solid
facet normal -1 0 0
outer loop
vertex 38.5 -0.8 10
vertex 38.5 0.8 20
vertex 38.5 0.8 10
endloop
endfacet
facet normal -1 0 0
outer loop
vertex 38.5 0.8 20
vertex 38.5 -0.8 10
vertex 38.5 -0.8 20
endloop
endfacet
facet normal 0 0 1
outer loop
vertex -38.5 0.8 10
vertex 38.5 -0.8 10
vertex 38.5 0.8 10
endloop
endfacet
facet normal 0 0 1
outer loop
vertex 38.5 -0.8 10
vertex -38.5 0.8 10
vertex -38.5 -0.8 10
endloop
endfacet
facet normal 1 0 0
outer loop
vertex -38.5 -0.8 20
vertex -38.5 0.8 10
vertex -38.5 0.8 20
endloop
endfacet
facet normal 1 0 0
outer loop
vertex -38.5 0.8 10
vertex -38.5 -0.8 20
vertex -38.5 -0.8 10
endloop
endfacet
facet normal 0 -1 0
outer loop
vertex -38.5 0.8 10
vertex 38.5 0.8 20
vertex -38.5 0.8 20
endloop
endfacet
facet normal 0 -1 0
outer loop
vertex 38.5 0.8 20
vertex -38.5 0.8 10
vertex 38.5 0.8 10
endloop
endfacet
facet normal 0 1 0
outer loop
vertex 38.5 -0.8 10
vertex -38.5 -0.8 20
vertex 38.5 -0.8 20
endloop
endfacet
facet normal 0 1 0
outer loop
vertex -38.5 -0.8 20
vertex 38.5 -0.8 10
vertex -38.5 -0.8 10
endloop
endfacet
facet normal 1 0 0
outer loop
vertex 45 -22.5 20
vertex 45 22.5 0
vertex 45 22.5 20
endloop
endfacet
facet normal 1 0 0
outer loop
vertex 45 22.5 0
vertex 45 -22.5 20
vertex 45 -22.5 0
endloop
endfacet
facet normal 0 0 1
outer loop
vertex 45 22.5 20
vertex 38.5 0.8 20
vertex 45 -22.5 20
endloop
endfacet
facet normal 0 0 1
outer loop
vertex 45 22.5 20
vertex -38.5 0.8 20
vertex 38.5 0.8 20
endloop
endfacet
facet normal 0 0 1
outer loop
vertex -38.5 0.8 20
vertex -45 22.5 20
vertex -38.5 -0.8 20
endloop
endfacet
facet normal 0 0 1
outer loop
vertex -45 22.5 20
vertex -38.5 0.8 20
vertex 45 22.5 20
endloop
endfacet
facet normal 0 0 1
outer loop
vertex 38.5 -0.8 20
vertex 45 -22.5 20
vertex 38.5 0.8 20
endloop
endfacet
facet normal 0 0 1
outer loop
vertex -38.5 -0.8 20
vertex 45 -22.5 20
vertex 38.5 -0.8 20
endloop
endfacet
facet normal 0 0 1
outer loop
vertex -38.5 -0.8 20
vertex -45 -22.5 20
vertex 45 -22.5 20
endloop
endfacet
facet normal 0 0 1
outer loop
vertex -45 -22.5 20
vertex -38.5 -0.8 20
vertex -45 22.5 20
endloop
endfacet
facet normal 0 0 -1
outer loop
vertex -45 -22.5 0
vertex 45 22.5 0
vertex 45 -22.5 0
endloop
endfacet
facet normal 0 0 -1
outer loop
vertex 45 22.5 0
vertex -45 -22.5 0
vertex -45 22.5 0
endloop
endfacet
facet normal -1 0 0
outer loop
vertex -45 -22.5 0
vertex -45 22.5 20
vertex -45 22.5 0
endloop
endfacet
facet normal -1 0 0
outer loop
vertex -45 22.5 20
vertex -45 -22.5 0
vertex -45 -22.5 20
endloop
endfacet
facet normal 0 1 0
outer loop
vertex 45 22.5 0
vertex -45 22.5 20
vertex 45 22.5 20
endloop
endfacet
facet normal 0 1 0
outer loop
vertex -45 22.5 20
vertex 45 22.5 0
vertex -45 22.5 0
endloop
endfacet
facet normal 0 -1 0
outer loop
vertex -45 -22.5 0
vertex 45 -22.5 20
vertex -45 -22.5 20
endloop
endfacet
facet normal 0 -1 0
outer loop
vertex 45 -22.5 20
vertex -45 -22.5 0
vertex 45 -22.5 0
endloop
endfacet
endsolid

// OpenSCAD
// Microscope slide drying rack
// Print orientation: base block on the bed (z = 0), slots open upward (+Z)

// ---------------- Parameters ----------------
block_len    = 90;   // base block length along X (mm)
block_wid    = 45;   // base block width along Y (mm)
block_h      = 20;   // base block height along Z (mm)

slot_count   = 10;   // number of microscope slide slots
slot_len     = 77;   // slot length along X (mm)
slot_w       = 1.6;  // slot width along Y (mm)
slot_depth   = 10;   // slot depth into block from top face (mm)
slot_pitch   = 3.5;  // centre-to-centre slot spacing along Y (mm)

eps          = 0.5;  // overshoot of cutters past faces (mm)

$fn = 64;

// ---------------- Model ----------------
difference() {
    // Base block, centred in X and Y, sitting on z = 0
    translate([-block_len/2, -block_wid/2, 0])
        cube([block_len, block_wid, block_h]);

    // Slots: along X, centred group in X and Y
    for (i = [0 : slot_count - 1]) {
        y = (i - (slot_count - 1)/2) * slot_pitch;
        translate([-slot_len/2, -slot_w/2, block_h - slot_depth])
            cube([slot_len, slot_w, slot_depth + eps]);
    }
}
